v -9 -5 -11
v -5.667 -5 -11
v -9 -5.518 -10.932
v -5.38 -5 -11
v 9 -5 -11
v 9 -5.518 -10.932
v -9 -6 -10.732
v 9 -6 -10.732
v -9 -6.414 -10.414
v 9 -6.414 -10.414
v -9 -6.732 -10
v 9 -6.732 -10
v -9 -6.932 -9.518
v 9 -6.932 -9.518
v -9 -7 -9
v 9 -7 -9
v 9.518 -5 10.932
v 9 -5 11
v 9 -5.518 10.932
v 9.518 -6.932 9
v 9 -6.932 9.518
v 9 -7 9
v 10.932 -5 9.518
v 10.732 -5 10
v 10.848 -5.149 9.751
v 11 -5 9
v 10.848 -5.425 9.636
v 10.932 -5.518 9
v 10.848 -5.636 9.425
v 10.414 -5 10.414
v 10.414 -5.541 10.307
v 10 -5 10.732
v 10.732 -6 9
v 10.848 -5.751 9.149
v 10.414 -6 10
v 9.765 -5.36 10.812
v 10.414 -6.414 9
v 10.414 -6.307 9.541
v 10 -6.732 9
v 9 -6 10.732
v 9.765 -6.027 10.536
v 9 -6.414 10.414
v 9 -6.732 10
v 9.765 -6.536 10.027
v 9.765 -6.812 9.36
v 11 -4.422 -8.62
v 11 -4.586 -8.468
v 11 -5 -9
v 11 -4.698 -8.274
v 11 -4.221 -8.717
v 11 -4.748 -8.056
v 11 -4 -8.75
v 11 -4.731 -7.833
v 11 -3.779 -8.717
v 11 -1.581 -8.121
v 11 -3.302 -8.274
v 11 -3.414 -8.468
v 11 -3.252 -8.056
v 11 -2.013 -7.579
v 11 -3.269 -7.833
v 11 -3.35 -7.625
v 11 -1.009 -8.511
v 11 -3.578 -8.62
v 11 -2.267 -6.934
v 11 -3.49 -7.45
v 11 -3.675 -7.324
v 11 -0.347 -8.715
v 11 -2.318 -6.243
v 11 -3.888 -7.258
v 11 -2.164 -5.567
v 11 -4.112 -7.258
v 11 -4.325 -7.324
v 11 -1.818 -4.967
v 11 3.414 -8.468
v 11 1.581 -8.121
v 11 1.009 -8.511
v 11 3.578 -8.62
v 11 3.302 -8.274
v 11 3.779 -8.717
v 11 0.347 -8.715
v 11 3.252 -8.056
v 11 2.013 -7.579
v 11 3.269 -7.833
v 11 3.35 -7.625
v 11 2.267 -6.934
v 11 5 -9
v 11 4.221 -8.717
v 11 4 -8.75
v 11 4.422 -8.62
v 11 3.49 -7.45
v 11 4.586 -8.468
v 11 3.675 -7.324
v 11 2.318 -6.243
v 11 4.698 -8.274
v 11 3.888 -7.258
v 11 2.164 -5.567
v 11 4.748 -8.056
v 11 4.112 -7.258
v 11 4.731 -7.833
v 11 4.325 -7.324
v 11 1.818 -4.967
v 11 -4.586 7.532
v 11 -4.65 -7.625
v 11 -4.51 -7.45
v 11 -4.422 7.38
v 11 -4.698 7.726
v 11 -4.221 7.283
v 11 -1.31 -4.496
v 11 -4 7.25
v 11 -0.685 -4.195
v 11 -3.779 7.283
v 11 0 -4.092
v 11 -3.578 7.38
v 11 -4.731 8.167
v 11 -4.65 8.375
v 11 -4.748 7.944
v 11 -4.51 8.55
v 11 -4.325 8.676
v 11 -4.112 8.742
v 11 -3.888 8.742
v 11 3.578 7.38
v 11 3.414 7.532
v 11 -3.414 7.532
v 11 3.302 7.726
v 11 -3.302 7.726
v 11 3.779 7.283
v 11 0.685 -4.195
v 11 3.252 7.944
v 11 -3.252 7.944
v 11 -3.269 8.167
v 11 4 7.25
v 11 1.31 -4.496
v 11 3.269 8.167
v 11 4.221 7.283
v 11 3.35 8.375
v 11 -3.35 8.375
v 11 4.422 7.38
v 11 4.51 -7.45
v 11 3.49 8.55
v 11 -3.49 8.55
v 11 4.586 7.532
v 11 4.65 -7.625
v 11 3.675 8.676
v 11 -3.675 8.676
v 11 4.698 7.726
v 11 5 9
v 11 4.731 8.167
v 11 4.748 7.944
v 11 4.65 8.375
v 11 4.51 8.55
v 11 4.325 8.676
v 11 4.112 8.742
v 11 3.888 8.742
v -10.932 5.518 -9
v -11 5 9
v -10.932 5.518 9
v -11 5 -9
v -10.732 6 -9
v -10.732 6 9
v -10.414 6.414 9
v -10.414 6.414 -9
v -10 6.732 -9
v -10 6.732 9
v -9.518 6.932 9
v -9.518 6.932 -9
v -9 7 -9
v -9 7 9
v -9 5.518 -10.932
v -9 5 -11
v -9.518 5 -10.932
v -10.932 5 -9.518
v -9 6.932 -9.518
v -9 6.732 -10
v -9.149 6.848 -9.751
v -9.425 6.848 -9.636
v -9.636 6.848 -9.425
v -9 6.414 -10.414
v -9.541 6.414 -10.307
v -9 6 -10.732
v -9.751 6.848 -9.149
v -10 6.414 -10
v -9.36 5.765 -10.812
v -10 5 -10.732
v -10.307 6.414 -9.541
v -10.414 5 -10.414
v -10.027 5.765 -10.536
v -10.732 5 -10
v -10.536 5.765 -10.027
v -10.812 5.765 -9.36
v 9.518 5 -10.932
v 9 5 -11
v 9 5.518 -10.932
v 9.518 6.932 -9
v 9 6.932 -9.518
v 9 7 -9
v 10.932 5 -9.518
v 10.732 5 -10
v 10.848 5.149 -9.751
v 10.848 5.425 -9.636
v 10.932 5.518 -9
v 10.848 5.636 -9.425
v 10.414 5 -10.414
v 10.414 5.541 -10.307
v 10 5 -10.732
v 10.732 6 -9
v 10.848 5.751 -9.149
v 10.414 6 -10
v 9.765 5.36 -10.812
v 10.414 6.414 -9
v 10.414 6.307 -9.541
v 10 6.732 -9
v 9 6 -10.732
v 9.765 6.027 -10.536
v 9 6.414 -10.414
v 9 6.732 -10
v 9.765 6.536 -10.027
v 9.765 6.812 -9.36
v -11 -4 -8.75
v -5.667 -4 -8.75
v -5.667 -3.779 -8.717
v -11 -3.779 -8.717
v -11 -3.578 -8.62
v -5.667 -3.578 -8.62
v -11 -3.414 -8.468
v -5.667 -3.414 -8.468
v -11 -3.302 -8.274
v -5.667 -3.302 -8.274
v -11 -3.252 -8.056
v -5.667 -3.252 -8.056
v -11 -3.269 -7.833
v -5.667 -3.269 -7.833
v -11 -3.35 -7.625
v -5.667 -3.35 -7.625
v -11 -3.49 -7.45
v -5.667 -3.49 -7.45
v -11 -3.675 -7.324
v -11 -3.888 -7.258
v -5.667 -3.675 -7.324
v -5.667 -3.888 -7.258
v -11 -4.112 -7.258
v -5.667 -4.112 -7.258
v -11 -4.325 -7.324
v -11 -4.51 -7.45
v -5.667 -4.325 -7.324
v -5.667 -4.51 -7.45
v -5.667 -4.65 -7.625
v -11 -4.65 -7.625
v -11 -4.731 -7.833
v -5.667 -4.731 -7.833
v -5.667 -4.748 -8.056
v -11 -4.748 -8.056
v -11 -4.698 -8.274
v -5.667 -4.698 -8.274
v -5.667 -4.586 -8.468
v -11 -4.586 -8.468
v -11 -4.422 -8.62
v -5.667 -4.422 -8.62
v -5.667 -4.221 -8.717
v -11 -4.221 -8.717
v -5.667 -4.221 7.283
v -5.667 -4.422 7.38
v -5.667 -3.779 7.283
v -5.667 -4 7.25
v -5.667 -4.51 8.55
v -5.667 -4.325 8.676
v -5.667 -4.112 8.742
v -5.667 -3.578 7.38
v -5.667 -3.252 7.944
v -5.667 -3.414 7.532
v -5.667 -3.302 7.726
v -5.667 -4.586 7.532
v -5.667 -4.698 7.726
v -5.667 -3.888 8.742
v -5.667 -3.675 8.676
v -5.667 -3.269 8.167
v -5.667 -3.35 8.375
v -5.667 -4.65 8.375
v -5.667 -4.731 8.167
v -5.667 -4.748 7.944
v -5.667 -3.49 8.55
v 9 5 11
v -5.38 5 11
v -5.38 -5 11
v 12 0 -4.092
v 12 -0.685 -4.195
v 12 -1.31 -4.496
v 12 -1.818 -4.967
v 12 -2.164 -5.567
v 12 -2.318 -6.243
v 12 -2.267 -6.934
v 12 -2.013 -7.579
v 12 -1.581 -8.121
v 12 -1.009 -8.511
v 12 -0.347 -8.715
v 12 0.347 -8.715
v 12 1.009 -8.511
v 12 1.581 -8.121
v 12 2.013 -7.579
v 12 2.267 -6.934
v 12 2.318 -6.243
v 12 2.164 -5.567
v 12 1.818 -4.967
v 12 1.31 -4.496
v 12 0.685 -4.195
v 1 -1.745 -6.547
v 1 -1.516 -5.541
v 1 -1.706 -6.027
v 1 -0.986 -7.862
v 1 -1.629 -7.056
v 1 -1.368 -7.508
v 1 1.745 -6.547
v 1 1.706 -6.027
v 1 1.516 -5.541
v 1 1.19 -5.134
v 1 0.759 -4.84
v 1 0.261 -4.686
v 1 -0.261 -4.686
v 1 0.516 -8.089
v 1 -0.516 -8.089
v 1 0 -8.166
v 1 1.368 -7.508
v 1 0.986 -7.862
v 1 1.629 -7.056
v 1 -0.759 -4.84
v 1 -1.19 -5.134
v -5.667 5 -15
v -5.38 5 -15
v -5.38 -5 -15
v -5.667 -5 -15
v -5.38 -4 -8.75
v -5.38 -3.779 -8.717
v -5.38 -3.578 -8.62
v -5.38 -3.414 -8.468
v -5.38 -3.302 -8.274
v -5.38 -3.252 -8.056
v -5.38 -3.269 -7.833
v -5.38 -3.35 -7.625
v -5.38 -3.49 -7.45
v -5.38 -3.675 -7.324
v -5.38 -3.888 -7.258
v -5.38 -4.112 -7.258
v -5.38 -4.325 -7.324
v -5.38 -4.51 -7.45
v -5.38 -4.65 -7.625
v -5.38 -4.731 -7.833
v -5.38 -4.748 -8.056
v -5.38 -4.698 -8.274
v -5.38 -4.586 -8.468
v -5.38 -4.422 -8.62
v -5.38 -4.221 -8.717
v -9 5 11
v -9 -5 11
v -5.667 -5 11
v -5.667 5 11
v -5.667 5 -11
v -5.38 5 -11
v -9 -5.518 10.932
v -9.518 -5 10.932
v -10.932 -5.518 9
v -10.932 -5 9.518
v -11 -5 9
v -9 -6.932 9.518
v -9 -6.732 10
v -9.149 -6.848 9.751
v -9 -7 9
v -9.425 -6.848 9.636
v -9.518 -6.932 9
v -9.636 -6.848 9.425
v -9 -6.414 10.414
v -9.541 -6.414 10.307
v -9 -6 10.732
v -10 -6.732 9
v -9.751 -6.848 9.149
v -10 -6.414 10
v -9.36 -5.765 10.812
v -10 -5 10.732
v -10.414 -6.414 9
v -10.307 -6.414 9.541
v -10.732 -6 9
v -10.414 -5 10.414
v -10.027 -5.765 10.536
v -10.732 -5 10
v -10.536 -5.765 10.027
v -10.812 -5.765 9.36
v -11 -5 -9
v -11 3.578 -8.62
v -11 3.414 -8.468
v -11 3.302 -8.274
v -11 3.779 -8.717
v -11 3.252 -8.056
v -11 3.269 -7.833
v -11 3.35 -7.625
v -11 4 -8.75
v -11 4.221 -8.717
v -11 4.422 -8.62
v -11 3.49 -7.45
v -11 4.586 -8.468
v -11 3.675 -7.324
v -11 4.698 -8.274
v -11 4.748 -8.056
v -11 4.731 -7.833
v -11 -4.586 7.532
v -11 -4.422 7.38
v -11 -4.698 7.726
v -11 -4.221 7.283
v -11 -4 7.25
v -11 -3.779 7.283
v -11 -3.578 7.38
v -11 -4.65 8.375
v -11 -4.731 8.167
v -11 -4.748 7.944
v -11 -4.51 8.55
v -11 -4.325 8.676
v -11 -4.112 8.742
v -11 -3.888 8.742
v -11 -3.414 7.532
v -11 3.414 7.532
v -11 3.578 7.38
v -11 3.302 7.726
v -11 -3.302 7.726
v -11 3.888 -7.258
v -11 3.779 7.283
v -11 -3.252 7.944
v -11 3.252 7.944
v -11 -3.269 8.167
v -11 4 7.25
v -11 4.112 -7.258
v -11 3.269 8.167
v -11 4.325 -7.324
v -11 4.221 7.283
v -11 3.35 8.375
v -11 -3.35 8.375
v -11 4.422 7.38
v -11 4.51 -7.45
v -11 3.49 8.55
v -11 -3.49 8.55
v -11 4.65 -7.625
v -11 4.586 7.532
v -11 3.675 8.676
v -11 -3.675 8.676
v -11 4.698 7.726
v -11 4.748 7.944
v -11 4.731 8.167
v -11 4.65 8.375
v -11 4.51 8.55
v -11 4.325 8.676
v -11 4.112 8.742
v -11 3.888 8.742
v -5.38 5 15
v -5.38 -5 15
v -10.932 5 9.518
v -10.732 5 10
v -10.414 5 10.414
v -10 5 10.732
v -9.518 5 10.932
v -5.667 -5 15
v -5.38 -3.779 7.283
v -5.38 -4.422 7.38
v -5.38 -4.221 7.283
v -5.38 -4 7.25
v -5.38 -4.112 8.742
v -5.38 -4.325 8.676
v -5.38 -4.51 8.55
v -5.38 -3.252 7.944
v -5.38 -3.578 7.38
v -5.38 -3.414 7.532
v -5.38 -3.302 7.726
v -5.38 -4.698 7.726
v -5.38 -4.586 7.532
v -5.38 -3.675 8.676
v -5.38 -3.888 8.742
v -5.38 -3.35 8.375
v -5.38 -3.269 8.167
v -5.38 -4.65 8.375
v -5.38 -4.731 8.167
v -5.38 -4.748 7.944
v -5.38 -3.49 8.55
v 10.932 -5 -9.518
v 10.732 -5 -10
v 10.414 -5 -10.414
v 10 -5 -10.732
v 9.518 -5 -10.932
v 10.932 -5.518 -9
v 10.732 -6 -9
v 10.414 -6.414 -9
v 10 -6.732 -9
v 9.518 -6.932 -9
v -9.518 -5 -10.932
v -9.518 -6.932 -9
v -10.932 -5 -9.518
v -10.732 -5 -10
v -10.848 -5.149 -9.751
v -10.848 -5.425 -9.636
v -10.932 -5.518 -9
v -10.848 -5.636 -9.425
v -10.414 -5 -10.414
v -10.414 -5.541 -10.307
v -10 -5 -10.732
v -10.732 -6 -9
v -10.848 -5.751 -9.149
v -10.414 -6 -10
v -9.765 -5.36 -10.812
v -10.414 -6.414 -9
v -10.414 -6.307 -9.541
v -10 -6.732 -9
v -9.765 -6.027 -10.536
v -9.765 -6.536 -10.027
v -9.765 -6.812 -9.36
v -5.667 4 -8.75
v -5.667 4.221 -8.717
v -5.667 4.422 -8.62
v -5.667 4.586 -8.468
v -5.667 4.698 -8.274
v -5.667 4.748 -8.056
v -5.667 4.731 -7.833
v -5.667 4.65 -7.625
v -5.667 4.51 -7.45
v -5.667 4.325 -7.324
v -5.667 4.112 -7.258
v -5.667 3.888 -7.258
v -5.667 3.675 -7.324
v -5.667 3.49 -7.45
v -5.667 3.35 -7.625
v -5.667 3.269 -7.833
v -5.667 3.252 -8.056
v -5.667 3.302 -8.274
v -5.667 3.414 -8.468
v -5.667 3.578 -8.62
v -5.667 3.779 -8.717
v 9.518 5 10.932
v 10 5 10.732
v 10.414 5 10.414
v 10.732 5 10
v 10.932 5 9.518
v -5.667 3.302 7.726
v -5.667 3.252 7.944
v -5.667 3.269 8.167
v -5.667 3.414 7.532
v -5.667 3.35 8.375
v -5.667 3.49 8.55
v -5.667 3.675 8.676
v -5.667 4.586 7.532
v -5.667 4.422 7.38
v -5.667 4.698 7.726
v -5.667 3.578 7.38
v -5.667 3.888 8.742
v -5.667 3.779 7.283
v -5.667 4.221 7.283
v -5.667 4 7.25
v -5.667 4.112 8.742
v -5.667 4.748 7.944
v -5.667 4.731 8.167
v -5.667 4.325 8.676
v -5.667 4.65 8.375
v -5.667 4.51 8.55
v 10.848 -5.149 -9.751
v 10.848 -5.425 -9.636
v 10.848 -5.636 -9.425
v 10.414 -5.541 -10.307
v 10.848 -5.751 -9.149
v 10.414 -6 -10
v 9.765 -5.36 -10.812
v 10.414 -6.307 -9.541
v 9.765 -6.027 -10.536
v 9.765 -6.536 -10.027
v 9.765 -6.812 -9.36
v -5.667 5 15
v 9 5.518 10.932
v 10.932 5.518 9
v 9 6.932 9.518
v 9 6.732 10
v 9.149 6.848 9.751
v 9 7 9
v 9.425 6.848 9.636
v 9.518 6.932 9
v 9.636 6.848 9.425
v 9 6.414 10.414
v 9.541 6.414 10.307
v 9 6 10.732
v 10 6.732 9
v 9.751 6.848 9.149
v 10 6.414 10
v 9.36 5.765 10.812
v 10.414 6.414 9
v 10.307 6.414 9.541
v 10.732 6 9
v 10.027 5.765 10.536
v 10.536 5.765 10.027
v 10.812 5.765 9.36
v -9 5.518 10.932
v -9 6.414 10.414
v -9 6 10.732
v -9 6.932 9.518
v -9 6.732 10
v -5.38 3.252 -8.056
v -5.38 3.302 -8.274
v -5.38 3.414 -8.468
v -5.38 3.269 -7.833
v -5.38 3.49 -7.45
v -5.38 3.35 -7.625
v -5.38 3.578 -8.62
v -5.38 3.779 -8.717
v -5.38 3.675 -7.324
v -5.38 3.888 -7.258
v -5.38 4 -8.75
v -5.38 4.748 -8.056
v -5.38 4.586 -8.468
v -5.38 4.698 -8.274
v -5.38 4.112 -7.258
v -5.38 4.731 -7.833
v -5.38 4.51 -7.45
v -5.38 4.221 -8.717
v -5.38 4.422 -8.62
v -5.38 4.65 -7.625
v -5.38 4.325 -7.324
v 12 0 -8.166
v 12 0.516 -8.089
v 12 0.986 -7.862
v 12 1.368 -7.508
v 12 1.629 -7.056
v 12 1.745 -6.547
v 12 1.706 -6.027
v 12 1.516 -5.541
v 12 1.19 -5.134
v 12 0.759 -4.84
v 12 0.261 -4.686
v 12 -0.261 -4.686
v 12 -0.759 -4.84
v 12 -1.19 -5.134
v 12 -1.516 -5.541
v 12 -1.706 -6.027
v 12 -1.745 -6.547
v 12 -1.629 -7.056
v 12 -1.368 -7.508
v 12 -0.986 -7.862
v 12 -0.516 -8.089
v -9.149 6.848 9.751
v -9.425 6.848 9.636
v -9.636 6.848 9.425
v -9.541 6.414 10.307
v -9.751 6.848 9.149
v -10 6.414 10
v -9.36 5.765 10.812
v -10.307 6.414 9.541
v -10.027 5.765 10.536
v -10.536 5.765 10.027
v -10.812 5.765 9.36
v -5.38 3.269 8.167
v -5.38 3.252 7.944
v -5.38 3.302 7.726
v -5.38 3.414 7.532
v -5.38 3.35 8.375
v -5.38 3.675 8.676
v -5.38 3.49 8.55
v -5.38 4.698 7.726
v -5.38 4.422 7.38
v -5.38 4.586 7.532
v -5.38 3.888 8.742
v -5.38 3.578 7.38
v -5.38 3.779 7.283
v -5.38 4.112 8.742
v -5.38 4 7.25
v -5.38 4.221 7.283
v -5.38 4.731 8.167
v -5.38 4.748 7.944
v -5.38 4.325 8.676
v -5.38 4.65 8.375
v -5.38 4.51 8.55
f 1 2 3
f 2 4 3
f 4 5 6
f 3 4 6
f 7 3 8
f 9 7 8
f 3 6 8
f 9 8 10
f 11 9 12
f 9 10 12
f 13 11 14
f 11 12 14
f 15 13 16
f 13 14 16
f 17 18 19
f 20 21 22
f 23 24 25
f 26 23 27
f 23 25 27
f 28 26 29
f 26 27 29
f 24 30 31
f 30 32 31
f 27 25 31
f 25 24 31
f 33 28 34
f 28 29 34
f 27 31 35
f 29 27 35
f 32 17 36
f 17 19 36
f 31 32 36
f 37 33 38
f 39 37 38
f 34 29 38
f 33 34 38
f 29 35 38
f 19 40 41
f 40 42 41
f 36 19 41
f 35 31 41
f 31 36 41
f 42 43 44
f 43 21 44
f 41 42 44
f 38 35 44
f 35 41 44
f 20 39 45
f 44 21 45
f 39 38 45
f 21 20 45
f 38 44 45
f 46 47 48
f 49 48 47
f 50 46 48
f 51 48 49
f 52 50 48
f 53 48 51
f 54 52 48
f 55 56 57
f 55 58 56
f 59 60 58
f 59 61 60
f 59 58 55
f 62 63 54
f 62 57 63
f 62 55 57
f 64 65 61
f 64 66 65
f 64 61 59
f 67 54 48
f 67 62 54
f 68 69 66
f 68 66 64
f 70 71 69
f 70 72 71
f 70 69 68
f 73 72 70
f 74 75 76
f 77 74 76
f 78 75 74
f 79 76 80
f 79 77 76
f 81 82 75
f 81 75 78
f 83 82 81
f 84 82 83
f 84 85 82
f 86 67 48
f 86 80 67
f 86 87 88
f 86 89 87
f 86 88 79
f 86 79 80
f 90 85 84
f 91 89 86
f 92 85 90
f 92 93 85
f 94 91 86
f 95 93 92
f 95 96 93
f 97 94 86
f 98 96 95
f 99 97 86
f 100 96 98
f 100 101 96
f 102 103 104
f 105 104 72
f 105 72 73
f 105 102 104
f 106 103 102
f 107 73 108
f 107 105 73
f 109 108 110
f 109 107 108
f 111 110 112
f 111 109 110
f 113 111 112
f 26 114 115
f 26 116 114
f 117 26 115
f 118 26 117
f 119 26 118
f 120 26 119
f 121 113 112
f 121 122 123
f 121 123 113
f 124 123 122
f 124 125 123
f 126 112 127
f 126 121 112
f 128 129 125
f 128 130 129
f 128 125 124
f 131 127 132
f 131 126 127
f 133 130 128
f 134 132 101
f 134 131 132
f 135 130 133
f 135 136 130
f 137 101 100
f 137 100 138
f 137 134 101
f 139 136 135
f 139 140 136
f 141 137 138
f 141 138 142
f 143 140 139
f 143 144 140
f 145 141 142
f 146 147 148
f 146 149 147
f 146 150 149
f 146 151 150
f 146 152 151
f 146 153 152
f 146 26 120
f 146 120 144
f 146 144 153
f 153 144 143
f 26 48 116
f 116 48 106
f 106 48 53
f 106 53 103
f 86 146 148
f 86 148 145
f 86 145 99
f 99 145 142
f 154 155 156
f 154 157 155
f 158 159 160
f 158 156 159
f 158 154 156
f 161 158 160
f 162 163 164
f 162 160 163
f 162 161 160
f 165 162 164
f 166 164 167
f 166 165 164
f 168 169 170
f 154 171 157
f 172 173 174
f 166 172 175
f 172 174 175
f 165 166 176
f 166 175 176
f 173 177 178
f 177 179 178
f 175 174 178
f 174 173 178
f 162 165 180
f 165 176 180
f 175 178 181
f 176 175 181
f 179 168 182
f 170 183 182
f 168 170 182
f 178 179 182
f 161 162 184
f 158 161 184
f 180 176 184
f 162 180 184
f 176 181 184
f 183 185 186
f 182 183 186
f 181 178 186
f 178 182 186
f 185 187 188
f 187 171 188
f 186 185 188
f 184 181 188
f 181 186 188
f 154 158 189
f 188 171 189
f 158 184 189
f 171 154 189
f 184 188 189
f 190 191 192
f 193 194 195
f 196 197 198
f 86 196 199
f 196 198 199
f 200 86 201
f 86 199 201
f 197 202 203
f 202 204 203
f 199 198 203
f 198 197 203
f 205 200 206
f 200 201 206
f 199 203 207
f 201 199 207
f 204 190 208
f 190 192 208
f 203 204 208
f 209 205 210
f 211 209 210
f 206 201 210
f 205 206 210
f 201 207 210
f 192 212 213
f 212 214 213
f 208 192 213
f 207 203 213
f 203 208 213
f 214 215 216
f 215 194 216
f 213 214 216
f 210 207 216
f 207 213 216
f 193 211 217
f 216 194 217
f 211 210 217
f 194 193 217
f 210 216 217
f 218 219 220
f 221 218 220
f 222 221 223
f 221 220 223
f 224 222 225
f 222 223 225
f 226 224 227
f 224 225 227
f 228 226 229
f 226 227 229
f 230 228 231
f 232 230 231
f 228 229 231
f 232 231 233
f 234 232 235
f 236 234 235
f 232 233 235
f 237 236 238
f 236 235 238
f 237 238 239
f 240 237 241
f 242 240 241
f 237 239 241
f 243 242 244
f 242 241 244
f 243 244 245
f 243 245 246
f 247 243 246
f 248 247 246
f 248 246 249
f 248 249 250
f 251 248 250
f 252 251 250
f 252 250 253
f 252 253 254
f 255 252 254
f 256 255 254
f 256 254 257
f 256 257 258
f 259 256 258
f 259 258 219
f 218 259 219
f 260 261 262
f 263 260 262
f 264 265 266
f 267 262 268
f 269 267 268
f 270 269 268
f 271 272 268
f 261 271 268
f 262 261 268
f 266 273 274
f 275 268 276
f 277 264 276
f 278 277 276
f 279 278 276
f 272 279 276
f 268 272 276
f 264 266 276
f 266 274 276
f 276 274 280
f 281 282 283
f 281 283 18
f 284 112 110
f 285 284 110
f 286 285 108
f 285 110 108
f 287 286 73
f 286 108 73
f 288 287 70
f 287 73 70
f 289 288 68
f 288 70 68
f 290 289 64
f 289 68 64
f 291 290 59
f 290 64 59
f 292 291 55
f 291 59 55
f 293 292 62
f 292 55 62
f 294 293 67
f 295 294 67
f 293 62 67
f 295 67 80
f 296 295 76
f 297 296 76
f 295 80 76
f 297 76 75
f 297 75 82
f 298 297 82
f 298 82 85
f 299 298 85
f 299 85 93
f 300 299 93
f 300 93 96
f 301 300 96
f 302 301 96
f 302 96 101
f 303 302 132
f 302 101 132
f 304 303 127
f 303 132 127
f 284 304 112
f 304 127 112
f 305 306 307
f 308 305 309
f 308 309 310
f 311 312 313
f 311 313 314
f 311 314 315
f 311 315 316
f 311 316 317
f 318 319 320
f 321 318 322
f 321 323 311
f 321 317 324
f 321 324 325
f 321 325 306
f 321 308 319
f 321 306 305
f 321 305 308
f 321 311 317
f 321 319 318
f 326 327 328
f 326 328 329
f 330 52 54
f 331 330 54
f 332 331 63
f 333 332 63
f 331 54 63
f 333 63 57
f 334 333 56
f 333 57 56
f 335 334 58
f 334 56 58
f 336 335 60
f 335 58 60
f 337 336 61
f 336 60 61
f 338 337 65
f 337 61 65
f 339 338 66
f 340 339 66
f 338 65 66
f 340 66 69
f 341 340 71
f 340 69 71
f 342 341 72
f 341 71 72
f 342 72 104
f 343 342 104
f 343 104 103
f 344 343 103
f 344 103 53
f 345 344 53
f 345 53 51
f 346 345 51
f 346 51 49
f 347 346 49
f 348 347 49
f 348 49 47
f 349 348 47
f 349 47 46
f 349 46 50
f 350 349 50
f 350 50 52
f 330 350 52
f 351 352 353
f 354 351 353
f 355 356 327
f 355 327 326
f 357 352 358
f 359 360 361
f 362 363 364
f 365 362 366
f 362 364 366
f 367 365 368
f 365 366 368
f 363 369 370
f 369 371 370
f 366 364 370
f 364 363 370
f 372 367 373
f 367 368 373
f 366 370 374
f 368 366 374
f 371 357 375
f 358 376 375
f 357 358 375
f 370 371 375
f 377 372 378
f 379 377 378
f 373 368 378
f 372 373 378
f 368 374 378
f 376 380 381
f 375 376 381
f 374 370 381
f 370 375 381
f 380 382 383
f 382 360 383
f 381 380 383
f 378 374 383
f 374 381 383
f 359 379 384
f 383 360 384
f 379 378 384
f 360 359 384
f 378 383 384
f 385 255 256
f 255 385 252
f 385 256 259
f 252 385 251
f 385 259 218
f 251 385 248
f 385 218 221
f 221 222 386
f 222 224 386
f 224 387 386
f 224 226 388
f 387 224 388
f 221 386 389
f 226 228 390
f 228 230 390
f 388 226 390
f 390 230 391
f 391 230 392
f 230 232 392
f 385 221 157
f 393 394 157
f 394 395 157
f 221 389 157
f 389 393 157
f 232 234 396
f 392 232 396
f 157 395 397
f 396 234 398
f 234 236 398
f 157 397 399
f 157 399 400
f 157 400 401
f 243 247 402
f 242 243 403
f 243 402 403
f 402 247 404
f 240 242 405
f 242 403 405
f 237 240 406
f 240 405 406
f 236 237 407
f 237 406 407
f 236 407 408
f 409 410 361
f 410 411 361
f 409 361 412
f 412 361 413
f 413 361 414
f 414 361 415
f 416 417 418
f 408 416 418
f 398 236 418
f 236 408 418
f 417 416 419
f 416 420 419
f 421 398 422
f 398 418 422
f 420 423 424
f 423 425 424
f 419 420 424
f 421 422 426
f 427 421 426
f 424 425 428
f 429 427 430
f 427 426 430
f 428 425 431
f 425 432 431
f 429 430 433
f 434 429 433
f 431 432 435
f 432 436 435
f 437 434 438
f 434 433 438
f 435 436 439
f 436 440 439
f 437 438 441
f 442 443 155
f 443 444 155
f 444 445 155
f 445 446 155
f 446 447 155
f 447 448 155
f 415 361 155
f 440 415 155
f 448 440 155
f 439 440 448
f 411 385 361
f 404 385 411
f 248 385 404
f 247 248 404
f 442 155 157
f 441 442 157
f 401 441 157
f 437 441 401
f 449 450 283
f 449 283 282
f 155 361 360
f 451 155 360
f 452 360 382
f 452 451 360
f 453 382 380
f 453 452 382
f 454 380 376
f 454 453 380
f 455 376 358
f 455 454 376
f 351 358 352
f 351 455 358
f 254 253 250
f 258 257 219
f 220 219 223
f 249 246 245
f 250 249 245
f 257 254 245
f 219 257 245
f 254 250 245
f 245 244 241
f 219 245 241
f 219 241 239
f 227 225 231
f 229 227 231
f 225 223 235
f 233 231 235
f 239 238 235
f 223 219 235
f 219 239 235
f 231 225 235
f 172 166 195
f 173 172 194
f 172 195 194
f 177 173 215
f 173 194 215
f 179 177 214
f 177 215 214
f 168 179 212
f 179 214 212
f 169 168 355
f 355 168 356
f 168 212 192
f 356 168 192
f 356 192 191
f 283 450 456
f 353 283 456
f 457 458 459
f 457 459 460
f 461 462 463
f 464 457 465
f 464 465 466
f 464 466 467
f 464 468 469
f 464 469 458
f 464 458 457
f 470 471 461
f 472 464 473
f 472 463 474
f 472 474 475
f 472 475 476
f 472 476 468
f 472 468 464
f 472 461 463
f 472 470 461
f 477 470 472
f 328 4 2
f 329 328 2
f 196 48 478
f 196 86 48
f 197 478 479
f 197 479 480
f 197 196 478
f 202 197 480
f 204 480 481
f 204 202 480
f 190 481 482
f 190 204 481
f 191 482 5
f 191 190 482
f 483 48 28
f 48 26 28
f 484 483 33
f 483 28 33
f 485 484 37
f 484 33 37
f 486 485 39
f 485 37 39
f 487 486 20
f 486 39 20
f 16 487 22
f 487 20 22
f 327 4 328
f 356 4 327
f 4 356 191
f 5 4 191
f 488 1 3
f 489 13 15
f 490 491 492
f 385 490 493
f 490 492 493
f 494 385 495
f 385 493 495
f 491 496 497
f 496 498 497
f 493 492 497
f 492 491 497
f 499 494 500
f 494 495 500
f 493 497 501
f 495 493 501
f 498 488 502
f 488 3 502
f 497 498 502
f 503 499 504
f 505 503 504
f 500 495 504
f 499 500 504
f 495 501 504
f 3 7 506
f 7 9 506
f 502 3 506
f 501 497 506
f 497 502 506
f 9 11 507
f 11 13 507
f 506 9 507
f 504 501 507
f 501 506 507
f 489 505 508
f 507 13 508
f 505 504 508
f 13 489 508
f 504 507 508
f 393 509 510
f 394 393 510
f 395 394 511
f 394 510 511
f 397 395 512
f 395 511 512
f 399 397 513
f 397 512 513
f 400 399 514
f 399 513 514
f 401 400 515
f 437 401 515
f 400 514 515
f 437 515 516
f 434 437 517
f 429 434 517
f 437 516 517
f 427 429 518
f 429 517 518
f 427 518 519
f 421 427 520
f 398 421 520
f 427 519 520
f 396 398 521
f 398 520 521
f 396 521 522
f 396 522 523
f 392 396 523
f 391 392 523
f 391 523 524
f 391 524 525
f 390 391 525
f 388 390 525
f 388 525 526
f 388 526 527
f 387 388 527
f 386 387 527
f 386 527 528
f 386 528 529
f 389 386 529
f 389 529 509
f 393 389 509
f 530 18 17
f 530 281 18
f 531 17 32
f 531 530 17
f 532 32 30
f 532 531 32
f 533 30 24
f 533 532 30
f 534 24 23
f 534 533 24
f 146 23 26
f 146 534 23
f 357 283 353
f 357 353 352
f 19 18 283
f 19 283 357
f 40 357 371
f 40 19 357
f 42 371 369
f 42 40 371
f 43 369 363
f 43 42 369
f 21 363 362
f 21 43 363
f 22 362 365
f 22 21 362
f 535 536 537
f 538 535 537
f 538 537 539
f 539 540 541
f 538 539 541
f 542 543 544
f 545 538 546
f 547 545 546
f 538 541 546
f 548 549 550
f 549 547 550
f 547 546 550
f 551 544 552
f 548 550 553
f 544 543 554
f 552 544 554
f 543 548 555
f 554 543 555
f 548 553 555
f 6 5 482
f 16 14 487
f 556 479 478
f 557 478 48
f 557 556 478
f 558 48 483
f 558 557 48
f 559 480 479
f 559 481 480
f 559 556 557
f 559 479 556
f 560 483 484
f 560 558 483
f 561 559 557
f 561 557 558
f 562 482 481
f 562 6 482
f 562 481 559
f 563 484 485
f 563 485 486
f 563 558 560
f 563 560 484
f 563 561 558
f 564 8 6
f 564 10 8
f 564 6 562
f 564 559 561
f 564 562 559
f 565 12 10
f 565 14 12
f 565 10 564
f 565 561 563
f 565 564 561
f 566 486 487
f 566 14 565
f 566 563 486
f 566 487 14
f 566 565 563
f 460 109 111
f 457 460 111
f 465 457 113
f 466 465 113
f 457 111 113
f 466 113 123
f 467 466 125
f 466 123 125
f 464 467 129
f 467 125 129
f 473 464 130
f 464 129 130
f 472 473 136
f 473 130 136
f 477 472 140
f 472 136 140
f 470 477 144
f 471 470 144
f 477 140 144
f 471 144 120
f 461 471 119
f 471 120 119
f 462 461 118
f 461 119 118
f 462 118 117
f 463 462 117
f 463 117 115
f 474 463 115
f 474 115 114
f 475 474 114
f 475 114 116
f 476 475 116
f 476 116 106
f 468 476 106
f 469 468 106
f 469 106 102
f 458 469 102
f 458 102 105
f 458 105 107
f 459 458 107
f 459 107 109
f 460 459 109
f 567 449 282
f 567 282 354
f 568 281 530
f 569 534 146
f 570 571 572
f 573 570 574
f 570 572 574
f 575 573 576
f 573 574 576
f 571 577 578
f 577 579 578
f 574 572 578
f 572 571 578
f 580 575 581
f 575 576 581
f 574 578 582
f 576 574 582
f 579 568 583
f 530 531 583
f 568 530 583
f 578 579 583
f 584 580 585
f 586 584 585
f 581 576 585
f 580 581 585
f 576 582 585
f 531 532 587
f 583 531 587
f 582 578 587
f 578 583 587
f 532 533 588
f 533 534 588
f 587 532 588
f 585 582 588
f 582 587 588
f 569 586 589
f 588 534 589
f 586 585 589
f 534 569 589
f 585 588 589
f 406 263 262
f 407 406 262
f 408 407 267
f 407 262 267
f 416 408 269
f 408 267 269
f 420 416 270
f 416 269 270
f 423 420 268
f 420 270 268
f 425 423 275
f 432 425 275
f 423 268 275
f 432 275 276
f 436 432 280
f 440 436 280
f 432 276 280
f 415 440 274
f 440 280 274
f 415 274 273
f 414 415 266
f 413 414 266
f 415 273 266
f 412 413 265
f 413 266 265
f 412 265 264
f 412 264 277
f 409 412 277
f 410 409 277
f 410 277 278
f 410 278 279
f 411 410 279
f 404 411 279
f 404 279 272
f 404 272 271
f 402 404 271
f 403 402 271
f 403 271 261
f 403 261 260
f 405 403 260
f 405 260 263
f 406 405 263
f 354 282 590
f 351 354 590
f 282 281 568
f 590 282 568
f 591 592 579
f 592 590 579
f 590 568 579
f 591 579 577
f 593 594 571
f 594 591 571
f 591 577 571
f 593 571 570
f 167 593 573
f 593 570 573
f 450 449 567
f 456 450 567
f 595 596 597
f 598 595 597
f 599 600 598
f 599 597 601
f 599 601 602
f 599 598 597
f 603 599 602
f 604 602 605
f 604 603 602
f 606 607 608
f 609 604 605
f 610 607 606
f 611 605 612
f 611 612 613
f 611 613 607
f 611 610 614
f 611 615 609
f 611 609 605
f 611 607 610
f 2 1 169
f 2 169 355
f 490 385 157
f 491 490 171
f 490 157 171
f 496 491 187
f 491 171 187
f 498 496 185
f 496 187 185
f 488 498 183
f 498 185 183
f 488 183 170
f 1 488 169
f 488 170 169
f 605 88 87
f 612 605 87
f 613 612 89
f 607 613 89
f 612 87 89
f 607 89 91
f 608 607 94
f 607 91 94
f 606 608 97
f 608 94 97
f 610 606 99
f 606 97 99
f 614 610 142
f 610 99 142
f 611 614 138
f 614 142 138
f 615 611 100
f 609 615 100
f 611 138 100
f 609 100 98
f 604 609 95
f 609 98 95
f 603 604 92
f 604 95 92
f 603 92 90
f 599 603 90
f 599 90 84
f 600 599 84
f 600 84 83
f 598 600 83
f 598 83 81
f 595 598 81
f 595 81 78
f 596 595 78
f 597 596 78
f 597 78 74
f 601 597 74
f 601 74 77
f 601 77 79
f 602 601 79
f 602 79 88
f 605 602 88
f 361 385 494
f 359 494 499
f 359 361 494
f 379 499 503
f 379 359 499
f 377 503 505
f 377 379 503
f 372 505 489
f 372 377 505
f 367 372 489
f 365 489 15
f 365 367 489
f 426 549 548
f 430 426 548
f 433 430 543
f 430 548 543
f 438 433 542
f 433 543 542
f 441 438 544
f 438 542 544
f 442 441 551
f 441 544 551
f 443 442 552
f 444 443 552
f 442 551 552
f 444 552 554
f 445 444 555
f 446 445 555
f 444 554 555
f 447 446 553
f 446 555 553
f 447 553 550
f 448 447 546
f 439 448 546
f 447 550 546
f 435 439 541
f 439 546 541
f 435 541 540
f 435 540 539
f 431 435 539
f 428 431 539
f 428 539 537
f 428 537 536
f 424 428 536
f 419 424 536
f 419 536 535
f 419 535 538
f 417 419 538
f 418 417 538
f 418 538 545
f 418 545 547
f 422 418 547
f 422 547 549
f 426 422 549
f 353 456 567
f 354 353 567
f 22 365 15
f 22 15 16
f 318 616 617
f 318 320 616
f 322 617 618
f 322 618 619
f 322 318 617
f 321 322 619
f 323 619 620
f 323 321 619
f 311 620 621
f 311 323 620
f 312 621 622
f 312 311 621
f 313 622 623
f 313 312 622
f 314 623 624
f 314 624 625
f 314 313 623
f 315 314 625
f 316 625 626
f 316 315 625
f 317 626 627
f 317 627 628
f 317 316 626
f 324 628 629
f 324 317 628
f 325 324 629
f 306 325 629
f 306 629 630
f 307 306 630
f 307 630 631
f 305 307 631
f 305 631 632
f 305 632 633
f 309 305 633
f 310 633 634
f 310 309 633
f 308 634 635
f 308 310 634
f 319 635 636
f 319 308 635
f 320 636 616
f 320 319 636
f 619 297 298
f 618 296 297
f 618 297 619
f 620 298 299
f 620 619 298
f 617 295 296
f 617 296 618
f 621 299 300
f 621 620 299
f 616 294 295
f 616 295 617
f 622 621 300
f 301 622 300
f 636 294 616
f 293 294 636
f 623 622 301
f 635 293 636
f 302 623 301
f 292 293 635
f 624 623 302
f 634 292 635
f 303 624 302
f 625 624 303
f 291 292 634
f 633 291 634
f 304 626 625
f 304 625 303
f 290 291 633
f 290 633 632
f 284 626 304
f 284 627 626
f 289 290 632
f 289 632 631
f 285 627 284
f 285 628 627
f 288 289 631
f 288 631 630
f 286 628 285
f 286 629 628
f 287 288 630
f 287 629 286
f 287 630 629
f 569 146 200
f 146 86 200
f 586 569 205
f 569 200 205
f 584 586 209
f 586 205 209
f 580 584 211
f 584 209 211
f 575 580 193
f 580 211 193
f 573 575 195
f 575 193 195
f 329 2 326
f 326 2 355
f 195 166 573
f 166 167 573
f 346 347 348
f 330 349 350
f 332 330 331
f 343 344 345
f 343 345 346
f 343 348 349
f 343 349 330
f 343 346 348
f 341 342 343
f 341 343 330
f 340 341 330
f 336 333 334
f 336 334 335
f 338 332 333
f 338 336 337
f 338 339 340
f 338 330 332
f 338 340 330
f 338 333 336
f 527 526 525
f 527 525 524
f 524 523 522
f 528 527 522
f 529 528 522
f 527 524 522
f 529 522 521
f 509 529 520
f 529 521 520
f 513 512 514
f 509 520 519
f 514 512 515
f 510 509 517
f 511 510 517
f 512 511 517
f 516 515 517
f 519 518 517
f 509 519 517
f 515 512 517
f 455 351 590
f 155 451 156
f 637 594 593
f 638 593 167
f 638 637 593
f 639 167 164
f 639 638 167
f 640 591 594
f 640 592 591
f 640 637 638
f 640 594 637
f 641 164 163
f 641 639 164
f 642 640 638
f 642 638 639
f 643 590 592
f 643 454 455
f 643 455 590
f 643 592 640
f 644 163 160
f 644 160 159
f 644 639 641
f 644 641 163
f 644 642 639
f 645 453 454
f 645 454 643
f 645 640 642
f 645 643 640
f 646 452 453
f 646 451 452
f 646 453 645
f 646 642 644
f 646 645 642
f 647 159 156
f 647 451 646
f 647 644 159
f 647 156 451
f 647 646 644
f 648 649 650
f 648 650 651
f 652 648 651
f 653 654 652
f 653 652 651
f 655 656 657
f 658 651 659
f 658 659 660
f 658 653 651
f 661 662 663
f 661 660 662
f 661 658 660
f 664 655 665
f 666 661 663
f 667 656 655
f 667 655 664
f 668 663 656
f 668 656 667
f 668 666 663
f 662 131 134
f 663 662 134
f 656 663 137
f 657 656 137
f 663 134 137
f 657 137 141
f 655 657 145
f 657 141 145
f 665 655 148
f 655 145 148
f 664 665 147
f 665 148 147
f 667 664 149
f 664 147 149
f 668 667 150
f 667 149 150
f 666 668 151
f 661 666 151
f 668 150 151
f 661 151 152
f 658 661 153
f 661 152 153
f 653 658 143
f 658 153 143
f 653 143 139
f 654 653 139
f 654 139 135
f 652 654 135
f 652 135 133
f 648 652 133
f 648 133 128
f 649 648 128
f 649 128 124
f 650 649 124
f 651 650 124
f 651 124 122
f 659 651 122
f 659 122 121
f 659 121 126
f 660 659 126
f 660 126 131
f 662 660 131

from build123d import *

# Parameters (mm, degrees)
SKETCH1_W                = 22
SKETCH1_H                = 14
BOSS_EXTRUDE1_DEPTH      = 11
FILLET1_R                = 2
SKETCH4_R                = 0.75
CUT_EXTRUDE1_DEPTH       = 28
SKETCH5_R                = 2.324910534
SKETCH5_R_2              = 1.75
BOSS_EXTRUDE2_DEPTH      = 1
CUT_EXTRUDE2_START       = -10
SKETCH5_2_R              = 1.75
CUT_EXTRUDE2_DEPTH       = 10
BOSS_EXTRUDE3_DEPTH      = 4
BOSS_EXTRUDE3_DEPTH_BACK = 26
SKETCH6_W                = 0.286837791
SKETCH6_H                = 10


with BuildPart() as part:
    # Sketch1 → Boss-Extrude1 (new, symmetric)
    with BuildSketch(Plane.XY):
        Rectangle(SKETCH1_W, SKETCH1_H)
    extrude(amount=BOSS_EXTRUDE1_DEPTH, both=True)

    # Fillet1
    fillet1_edges = [part.edges().sort_by_distance(p)[0] for p in [
        (-11, 0, 11),
        (0, -7, 11),
        (11, 0, 11),
        (0, -7, -11),
        (-11, 0, -11),
        (0, 7, -11),
        (11, 0, -11),
        (0, 7, 11),
        (11, -7, 0),
        (-11, -7, 0),
        (-11, 7, 0),
        (11, 7, 0),
    ]]
    fillet(fillet1_edges, radius=FILLET1_R)

    # Sketch4 → Cut-Extrude1 (cut)
    with BuildSketch(Plane(origin=(11, 0, 0), x_dir=(0, 0, -1), z_dir=(1, 0, 0))):
        with Locations((-8, 4)):
            Circle(SKETCH4_R)
        with Locations((-8, -4)):
            Circle(SKETCH4_R)
        with Locations((8, -4)):
            Circle(SKETCH4_R)
        with Locations((8, 4)):
            Circle(SKETCH4_R)
    extrude(amount=-CUT_EXTRUDE1_DEPTH, mode=Mode.SUBTRACT)

    # Sketch5 → Boss-Extrude2 (add)
    with BuildSketch(Plane(origin=(11, 0, 0), x_dir=(0, 0, -1), z_dir=(1, 0, 0))):
        with Locations(Location((6.416436668, 0, 0), (0, 0, 180))):
            Circle(SKETCH5_R)
        with Locations((6.416436668, 0)):
            Circle(SKETCH5_R_2, mode=Mode.SUBTRACT)
    extrude(amount=BOSS_EXTRUDE2_DEPTH)

    # Sketch5<2> → Cut-Extrude2 (cut)
    with BuildSketch(Plane(origin=(11, 0, 0), x_dir=(0, 0, -1), z_dir=(1, 0, 0)).offset(CUT_EXTRUDE2_START)):
        with Locations((6.416436668, 0)):
            Circle(SKETCH5_2_R)
    extrude(amount=CUT_EXTRUDE2_DEPTH, mode=Mode.SUBTRACT)

    # Sketch6 → Boss-Extrude3 (add, two sides: drawn at the far end of the back side and taken through both)
    with BuildSketch(Plane(origin=(0, 0, -11), x_dir=(-1, 0, 0), z_dir=(0, 0, -1)).offset(-BOSS_EXTRUDE3_DEPTH_BACK)):
        with Locations((5.523593607, 0)):
            Rectangle(SKETCH6_W, SKETCH6_H)
    extrude(amount=BOSS_EXTRUDE3_DEPTH + BOSS_EXTRUDE3_DEPTH_BACK)


solid = part.part
